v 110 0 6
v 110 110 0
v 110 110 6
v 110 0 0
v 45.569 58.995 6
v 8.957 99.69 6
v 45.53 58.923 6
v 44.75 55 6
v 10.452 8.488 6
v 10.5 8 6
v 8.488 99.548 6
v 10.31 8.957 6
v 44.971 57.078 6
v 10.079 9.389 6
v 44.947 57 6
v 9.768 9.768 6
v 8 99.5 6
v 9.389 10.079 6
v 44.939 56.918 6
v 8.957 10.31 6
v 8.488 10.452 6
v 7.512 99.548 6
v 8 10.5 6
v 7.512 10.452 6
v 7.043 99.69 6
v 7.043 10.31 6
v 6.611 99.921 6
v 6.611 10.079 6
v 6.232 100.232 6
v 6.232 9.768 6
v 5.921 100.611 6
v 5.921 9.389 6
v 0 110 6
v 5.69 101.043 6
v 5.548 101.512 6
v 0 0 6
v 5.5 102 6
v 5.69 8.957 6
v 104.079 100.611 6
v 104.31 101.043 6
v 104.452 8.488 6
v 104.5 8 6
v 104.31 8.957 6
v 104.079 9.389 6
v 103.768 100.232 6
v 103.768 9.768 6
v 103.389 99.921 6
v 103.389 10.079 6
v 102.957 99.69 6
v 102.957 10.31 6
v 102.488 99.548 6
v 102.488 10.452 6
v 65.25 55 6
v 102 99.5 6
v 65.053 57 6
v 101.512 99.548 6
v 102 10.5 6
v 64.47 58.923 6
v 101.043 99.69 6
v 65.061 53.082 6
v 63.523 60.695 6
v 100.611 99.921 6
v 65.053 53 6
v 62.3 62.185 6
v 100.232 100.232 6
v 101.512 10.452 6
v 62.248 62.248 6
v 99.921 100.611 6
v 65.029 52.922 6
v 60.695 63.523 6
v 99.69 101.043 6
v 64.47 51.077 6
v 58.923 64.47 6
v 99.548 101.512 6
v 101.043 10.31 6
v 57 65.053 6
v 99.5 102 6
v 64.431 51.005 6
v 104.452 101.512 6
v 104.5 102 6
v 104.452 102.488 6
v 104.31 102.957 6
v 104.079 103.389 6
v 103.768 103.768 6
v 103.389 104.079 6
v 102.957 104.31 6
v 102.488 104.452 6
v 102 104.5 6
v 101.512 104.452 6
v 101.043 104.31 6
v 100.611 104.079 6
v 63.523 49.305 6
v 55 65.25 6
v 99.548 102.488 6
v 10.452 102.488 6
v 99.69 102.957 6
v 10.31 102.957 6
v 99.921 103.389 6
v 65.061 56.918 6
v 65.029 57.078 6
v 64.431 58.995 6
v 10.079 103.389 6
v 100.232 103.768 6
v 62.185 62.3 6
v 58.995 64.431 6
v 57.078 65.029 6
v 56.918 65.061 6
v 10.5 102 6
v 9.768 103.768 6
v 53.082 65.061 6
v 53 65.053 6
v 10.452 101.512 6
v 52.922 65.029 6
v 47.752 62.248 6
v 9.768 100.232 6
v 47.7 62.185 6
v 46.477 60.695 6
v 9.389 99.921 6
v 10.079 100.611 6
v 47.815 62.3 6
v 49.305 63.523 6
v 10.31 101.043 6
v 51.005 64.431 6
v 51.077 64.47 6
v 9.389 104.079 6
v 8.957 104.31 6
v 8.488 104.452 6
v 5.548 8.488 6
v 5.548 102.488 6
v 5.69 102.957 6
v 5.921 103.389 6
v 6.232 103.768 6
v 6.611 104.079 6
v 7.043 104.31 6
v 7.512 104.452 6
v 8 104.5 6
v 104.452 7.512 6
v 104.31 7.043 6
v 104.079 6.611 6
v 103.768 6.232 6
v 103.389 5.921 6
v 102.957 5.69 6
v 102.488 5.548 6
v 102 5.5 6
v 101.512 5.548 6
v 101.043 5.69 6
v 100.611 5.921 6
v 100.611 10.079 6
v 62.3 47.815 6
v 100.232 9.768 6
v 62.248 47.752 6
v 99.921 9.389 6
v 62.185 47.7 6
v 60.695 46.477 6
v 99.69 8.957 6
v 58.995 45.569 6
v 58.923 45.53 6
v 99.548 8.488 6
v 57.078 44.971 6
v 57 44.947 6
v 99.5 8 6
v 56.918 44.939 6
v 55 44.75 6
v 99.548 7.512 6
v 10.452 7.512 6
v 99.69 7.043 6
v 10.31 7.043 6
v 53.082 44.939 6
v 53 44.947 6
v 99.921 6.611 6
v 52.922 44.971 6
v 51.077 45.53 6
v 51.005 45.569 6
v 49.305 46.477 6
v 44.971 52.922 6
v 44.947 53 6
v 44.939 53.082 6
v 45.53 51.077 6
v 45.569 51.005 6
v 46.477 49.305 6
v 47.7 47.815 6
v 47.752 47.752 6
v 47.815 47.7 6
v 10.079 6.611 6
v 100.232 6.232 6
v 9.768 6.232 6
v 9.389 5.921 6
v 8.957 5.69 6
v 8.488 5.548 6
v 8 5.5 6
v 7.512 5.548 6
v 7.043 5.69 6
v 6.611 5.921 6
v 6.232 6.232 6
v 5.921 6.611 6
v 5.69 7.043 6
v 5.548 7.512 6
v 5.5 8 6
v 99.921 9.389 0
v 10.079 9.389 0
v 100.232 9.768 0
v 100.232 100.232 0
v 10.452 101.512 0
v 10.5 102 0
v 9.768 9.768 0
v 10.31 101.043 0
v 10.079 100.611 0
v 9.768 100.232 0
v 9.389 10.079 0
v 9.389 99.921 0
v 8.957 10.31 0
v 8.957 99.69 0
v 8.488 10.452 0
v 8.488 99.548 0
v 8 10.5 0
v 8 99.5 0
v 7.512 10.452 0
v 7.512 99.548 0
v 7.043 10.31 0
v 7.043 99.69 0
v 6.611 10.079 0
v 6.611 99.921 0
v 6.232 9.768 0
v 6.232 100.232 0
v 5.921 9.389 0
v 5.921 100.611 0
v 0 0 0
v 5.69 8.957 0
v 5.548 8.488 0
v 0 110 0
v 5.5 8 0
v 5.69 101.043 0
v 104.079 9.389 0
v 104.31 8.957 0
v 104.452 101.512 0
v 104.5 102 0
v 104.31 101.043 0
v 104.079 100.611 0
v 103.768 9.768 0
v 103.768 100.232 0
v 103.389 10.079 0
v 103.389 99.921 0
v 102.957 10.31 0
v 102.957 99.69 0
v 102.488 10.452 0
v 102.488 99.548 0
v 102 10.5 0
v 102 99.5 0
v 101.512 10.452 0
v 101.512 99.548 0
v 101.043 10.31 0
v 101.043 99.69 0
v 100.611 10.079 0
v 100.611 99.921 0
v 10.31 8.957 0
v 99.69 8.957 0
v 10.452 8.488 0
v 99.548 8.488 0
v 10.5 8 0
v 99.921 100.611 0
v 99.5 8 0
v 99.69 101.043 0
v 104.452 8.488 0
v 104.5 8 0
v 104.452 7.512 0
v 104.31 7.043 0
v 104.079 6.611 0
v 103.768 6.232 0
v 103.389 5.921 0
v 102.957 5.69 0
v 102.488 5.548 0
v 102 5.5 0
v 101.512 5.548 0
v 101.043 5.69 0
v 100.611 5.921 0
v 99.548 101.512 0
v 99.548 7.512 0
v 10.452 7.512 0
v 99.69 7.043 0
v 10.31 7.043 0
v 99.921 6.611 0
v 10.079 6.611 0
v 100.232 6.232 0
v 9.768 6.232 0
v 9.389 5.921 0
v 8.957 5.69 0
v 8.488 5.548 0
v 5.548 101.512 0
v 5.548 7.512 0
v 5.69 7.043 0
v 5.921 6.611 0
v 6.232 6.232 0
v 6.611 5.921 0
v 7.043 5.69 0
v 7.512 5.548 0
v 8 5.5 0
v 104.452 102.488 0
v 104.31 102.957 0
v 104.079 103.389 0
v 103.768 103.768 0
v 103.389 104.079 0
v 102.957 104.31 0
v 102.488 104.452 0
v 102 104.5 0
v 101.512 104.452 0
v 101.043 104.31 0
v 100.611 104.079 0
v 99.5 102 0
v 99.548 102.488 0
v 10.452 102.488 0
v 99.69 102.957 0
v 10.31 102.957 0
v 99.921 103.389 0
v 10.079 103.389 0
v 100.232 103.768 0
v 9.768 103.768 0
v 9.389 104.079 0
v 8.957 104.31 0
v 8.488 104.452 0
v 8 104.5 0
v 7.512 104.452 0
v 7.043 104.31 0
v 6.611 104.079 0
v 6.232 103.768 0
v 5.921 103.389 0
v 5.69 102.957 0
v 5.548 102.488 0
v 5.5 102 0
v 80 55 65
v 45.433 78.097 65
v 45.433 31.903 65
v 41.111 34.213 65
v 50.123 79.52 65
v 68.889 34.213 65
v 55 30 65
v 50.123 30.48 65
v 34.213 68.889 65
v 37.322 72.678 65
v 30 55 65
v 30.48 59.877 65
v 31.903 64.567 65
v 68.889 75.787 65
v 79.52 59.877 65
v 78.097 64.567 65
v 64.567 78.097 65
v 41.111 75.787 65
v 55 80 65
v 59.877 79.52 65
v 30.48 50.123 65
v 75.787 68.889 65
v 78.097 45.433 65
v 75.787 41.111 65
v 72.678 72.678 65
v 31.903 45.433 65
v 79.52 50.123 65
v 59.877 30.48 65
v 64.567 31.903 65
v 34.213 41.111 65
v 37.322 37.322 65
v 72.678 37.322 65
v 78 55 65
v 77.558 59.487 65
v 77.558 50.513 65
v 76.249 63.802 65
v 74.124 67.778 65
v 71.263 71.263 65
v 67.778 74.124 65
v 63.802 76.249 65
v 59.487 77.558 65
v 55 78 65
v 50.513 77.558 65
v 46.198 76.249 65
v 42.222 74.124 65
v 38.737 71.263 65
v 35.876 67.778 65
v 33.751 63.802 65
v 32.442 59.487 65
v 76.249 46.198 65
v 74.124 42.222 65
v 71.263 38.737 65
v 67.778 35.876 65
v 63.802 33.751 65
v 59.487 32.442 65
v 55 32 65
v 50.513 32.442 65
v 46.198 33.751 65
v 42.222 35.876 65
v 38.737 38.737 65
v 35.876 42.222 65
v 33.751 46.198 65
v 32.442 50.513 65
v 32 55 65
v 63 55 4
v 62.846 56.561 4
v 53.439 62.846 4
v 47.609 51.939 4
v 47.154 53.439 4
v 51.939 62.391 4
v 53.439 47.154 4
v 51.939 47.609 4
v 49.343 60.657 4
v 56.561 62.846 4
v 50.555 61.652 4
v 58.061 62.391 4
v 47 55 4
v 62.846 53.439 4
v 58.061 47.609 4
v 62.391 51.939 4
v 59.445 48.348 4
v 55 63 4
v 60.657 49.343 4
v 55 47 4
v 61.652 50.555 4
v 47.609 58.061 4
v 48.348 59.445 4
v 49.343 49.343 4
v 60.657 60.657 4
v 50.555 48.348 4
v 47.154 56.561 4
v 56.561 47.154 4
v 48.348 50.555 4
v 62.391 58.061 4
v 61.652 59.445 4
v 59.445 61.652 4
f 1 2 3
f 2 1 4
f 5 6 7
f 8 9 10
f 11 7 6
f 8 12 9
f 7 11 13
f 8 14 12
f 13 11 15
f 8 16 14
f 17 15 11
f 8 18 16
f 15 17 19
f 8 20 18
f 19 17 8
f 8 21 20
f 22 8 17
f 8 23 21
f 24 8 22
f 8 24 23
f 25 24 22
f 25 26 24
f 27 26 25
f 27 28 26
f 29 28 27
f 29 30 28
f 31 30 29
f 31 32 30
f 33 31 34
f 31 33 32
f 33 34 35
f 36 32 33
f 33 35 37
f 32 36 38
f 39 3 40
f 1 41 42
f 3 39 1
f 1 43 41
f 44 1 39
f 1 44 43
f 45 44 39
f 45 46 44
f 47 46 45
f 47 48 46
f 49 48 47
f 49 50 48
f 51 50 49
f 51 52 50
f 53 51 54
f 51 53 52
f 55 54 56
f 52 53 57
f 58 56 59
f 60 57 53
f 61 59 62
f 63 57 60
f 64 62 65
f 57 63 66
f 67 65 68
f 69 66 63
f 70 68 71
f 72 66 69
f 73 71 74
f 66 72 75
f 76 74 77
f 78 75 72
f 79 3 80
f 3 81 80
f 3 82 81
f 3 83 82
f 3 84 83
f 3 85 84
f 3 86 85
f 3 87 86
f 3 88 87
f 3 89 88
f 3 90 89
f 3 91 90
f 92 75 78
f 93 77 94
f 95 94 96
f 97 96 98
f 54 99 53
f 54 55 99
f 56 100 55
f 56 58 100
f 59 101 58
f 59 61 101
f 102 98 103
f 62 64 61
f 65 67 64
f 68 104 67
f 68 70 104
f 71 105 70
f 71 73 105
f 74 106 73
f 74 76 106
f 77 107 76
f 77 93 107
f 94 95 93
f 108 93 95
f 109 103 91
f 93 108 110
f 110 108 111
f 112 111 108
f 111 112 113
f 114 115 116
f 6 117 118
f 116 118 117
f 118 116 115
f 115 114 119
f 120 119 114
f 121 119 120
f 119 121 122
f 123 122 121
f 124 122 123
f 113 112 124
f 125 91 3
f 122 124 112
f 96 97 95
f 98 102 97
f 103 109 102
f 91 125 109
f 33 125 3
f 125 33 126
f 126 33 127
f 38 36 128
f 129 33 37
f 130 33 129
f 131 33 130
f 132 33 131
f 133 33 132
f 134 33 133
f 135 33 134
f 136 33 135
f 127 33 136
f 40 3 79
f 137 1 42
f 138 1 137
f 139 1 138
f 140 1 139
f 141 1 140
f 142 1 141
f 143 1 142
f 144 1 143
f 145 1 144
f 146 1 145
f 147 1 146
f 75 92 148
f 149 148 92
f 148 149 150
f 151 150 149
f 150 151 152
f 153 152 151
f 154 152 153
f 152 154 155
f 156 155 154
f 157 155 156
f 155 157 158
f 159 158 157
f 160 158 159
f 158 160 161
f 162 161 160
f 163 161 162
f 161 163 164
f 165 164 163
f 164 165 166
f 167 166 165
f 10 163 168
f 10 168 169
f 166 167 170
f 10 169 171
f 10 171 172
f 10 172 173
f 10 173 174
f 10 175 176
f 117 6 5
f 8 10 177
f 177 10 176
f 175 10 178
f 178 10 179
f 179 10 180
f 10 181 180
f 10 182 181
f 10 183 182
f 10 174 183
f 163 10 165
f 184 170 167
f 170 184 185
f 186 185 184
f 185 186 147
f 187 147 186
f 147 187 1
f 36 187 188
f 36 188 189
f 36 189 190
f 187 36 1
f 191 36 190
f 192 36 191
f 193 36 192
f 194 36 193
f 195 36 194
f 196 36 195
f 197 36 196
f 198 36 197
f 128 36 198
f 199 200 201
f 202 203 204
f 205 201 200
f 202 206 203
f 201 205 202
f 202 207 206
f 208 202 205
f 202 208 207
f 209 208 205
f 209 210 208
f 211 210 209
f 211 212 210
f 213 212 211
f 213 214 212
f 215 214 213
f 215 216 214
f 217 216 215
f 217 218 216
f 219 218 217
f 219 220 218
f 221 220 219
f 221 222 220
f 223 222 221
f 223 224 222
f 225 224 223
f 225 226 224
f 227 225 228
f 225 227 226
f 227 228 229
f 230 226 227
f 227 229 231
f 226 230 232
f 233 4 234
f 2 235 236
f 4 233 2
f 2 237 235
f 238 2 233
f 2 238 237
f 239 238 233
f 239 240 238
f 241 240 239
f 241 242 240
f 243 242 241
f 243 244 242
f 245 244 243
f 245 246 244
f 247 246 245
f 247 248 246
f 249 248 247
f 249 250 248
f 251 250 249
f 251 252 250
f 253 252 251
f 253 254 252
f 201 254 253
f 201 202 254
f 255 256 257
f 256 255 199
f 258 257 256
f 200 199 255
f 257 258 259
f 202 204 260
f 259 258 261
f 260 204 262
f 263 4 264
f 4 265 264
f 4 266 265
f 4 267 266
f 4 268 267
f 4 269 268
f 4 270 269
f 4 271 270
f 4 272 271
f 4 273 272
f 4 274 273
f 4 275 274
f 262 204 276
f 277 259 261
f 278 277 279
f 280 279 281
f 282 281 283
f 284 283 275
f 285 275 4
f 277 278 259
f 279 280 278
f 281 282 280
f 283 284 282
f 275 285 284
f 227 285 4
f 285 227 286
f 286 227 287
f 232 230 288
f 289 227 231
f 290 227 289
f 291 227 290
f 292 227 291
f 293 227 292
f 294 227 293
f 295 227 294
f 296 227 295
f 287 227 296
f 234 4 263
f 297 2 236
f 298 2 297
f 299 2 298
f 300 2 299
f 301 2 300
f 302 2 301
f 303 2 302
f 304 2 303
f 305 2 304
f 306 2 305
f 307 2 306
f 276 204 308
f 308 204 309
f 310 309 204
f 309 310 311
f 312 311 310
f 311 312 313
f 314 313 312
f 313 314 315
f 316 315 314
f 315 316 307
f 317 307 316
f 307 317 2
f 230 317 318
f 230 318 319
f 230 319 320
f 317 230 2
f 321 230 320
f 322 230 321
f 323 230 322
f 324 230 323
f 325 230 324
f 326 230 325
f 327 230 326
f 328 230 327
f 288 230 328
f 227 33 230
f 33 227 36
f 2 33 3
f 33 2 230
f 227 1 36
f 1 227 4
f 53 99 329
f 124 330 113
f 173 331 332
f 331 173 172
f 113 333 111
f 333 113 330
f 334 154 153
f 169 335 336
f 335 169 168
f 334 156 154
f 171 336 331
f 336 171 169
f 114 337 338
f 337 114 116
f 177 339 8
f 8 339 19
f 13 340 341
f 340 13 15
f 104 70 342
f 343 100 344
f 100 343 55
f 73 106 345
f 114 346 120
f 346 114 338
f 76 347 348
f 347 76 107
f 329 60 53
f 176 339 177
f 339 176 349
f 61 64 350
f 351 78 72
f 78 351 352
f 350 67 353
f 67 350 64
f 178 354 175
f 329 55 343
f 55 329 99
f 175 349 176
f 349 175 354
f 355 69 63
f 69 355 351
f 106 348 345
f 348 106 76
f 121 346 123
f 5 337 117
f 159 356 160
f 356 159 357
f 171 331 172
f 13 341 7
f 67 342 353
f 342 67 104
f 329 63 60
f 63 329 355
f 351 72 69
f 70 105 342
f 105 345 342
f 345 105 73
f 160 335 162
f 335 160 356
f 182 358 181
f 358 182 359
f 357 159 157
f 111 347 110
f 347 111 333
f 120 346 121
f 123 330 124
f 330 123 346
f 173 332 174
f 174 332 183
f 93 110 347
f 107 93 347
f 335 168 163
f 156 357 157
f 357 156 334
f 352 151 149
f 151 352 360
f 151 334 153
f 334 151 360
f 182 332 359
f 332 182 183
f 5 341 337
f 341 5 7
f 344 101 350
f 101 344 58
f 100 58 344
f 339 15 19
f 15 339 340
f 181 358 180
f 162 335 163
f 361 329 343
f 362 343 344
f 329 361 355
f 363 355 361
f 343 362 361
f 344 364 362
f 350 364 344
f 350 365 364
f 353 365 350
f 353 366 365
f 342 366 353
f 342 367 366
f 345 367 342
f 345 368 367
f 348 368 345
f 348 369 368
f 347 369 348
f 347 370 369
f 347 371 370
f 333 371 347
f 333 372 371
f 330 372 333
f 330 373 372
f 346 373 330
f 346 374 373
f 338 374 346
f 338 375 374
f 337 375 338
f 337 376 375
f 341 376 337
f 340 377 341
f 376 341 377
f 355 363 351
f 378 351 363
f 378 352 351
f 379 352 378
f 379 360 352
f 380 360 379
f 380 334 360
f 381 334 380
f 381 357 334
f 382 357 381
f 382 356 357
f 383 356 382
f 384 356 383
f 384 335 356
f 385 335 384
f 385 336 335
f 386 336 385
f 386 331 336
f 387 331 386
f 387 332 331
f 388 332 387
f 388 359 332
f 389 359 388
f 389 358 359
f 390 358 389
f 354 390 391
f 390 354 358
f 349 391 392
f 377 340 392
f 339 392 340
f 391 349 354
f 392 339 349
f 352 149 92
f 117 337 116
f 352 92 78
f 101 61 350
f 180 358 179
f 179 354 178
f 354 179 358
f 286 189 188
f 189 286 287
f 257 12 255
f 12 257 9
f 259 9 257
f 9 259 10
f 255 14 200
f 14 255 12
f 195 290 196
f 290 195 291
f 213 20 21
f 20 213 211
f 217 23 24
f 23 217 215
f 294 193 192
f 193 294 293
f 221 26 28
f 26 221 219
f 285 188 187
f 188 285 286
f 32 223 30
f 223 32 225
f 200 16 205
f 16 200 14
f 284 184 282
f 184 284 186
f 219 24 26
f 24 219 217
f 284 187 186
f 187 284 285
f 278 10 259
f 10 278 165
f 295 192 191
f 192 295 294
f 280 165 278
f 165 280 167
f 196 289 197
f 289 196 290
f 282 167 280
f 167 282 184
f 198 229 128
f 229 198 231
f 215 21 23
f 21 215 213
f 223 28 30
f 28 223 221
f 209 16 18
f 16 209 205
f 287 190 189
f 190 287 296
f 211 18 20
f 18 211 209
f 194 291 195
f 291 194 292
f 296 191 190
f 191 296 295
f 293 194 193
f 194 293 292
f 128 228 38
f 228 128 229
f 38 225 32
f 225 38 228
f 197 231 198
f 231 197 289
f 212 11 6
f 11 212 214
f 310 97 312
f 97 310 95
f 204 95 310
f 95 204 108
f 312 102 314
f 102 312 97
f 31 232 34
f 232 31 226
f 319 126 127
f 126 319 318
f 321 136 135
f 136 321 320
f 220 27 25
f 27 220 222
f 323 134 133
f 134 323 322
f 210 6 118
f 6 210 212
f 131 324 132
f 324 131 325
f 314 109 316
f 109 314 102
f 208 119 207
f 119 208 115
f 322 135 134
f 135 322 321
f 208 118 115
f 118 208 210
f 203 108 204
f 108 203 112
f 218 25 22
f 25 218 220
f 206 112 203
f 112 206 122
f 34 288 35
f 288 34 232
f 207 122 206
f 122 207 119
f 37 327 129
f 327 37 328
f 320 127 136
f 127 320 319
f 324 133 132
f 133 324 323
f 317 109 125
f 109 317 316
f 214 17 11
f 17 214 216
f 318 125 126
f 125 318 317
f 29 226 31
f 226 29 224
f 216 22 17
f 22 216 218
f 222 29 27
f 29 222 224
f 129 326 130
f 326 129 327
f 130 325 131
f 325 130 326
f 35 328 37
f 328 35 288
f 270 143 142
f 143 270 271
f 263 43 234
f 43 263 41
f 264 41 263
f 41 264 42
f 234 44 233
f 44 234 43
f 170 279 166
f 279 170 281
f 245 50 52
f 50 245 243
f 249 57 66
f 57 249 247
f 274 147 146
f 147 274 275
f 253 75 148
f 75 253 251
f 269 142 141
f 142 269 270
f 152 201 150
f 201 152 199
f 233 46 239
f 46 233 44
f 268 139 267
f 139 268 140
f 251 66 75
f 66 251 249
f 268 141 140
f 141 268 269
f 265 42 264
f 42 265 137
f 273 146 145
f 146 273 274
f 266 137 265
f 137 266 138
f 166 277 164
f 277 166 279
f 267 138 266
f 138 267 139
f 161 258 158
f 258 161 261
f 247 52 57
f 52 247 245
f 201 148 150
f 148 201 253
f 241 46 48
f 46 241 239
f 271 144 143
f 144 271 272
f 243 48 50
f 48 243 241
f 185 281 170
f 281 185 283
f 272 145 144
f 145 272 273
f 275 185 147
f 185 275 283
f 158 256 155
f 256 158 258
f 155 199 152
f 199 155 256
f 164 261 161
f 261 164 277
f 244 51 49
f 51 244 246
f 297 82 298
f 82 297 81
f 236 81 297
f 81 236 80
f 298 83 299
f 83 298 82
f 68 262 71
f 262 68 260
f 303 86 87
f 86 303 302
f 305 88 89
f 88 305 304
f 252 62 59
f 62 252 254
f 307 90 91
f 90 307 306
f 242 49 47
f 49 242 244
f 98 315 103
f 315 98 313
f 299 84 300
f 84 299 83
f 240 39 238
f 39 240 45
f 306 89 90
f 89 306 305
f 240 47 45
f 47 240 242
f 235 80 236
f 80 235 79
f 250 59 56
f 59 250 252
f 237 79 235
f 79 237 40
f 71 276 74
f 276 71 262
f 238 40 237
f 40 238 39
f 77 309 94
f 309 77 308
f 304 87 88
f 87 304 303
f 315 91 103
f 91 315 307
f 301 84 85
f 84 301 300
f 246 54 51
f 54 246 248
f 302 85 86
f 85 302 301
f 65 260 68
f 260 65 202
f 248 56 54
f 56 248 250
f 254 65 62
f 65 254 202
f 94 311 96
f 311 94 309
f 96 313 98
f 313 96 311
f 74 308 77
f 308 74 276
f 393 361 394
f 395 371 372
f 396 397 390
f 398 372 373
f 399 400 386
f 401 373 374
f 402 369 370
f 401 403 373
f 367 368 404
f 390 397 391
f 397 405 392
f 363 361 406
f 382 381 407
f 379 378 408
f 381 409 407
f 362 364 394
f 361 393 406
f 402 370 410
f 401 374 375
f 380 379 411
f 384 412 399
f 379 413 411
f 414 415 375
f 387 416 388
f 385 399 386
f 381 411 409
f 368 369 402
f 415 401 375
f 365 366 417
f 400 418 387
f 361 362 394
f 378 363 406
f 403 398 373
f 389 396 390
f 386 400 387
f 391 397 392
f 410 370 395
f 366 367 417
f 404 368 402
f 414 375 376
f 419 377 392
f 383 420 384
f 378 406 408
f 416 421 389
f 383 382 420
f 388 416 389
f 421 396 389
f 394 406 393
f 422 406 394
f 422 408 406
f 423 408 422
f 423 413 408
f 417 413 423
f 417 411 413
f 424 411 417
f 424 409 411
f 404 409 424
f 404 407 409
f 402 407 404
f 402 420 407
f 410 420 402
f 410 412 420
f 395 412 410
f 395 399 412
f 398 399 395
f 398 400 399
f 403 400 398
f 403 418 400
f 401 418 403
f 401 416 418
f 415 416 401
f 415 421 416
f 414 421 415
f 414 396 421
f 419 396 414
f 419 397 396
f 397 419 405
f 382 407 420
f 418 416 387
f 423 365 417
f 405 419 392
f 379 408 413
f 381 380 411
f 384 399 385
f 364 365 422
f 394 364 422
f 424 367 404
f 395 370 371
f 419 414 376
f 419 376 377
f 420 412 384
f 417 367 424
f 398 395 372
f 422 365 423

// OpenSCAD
$fn = 32;

// ----------------------------------------------------------------------
// Hopper: flanged with square flange
// ----------------------------------------------------------------------

// --- parameters (mm) ---
fl = 110;                 // flange side, X and Y
fl_t = 6;                 // flange thickness
cone_h = 60;              // cone height above the flange
top_d = 50;               // cone mouth diameter
bot_d = 20;               // cone spout diameter
wall = 2;                 // cone wall thickness
hole_r = 2.5;             // flange hole radius
hole_in = 8;              // hole inset from the corners
fit_tol = 0.05;           // tolerance for press fits, mm
free_tol = 0.2;           // tolerance for clearance fits, mm

bore_d = bot_d - 2 * wall;  // spout bore diameter
total_h = fl_t + cone_h - 1;  // overall height

difference() {
  union() {
    cube([fl, fl, fl_t]);
    translate([fl / 2, fl / 2, fl_t - 1])
      cylinder(h = cone_h, d1 = bot_d, d2 = top_d);
  }
  translate([fl / 2, fl / 2, fl_t - 2])
    cylinder(h = cone_h + 1, d1 = bore_d, d2 = top_d - 2 * wall);
  for (sx = [0, 1], sy = [0, 1])
    translate([sx ? fl - hole_in : hole_in,
               sy ? fl - hole_in : hole_in, -1])
      cylinder(r = hole_r, h = fl_t + 2);
}
